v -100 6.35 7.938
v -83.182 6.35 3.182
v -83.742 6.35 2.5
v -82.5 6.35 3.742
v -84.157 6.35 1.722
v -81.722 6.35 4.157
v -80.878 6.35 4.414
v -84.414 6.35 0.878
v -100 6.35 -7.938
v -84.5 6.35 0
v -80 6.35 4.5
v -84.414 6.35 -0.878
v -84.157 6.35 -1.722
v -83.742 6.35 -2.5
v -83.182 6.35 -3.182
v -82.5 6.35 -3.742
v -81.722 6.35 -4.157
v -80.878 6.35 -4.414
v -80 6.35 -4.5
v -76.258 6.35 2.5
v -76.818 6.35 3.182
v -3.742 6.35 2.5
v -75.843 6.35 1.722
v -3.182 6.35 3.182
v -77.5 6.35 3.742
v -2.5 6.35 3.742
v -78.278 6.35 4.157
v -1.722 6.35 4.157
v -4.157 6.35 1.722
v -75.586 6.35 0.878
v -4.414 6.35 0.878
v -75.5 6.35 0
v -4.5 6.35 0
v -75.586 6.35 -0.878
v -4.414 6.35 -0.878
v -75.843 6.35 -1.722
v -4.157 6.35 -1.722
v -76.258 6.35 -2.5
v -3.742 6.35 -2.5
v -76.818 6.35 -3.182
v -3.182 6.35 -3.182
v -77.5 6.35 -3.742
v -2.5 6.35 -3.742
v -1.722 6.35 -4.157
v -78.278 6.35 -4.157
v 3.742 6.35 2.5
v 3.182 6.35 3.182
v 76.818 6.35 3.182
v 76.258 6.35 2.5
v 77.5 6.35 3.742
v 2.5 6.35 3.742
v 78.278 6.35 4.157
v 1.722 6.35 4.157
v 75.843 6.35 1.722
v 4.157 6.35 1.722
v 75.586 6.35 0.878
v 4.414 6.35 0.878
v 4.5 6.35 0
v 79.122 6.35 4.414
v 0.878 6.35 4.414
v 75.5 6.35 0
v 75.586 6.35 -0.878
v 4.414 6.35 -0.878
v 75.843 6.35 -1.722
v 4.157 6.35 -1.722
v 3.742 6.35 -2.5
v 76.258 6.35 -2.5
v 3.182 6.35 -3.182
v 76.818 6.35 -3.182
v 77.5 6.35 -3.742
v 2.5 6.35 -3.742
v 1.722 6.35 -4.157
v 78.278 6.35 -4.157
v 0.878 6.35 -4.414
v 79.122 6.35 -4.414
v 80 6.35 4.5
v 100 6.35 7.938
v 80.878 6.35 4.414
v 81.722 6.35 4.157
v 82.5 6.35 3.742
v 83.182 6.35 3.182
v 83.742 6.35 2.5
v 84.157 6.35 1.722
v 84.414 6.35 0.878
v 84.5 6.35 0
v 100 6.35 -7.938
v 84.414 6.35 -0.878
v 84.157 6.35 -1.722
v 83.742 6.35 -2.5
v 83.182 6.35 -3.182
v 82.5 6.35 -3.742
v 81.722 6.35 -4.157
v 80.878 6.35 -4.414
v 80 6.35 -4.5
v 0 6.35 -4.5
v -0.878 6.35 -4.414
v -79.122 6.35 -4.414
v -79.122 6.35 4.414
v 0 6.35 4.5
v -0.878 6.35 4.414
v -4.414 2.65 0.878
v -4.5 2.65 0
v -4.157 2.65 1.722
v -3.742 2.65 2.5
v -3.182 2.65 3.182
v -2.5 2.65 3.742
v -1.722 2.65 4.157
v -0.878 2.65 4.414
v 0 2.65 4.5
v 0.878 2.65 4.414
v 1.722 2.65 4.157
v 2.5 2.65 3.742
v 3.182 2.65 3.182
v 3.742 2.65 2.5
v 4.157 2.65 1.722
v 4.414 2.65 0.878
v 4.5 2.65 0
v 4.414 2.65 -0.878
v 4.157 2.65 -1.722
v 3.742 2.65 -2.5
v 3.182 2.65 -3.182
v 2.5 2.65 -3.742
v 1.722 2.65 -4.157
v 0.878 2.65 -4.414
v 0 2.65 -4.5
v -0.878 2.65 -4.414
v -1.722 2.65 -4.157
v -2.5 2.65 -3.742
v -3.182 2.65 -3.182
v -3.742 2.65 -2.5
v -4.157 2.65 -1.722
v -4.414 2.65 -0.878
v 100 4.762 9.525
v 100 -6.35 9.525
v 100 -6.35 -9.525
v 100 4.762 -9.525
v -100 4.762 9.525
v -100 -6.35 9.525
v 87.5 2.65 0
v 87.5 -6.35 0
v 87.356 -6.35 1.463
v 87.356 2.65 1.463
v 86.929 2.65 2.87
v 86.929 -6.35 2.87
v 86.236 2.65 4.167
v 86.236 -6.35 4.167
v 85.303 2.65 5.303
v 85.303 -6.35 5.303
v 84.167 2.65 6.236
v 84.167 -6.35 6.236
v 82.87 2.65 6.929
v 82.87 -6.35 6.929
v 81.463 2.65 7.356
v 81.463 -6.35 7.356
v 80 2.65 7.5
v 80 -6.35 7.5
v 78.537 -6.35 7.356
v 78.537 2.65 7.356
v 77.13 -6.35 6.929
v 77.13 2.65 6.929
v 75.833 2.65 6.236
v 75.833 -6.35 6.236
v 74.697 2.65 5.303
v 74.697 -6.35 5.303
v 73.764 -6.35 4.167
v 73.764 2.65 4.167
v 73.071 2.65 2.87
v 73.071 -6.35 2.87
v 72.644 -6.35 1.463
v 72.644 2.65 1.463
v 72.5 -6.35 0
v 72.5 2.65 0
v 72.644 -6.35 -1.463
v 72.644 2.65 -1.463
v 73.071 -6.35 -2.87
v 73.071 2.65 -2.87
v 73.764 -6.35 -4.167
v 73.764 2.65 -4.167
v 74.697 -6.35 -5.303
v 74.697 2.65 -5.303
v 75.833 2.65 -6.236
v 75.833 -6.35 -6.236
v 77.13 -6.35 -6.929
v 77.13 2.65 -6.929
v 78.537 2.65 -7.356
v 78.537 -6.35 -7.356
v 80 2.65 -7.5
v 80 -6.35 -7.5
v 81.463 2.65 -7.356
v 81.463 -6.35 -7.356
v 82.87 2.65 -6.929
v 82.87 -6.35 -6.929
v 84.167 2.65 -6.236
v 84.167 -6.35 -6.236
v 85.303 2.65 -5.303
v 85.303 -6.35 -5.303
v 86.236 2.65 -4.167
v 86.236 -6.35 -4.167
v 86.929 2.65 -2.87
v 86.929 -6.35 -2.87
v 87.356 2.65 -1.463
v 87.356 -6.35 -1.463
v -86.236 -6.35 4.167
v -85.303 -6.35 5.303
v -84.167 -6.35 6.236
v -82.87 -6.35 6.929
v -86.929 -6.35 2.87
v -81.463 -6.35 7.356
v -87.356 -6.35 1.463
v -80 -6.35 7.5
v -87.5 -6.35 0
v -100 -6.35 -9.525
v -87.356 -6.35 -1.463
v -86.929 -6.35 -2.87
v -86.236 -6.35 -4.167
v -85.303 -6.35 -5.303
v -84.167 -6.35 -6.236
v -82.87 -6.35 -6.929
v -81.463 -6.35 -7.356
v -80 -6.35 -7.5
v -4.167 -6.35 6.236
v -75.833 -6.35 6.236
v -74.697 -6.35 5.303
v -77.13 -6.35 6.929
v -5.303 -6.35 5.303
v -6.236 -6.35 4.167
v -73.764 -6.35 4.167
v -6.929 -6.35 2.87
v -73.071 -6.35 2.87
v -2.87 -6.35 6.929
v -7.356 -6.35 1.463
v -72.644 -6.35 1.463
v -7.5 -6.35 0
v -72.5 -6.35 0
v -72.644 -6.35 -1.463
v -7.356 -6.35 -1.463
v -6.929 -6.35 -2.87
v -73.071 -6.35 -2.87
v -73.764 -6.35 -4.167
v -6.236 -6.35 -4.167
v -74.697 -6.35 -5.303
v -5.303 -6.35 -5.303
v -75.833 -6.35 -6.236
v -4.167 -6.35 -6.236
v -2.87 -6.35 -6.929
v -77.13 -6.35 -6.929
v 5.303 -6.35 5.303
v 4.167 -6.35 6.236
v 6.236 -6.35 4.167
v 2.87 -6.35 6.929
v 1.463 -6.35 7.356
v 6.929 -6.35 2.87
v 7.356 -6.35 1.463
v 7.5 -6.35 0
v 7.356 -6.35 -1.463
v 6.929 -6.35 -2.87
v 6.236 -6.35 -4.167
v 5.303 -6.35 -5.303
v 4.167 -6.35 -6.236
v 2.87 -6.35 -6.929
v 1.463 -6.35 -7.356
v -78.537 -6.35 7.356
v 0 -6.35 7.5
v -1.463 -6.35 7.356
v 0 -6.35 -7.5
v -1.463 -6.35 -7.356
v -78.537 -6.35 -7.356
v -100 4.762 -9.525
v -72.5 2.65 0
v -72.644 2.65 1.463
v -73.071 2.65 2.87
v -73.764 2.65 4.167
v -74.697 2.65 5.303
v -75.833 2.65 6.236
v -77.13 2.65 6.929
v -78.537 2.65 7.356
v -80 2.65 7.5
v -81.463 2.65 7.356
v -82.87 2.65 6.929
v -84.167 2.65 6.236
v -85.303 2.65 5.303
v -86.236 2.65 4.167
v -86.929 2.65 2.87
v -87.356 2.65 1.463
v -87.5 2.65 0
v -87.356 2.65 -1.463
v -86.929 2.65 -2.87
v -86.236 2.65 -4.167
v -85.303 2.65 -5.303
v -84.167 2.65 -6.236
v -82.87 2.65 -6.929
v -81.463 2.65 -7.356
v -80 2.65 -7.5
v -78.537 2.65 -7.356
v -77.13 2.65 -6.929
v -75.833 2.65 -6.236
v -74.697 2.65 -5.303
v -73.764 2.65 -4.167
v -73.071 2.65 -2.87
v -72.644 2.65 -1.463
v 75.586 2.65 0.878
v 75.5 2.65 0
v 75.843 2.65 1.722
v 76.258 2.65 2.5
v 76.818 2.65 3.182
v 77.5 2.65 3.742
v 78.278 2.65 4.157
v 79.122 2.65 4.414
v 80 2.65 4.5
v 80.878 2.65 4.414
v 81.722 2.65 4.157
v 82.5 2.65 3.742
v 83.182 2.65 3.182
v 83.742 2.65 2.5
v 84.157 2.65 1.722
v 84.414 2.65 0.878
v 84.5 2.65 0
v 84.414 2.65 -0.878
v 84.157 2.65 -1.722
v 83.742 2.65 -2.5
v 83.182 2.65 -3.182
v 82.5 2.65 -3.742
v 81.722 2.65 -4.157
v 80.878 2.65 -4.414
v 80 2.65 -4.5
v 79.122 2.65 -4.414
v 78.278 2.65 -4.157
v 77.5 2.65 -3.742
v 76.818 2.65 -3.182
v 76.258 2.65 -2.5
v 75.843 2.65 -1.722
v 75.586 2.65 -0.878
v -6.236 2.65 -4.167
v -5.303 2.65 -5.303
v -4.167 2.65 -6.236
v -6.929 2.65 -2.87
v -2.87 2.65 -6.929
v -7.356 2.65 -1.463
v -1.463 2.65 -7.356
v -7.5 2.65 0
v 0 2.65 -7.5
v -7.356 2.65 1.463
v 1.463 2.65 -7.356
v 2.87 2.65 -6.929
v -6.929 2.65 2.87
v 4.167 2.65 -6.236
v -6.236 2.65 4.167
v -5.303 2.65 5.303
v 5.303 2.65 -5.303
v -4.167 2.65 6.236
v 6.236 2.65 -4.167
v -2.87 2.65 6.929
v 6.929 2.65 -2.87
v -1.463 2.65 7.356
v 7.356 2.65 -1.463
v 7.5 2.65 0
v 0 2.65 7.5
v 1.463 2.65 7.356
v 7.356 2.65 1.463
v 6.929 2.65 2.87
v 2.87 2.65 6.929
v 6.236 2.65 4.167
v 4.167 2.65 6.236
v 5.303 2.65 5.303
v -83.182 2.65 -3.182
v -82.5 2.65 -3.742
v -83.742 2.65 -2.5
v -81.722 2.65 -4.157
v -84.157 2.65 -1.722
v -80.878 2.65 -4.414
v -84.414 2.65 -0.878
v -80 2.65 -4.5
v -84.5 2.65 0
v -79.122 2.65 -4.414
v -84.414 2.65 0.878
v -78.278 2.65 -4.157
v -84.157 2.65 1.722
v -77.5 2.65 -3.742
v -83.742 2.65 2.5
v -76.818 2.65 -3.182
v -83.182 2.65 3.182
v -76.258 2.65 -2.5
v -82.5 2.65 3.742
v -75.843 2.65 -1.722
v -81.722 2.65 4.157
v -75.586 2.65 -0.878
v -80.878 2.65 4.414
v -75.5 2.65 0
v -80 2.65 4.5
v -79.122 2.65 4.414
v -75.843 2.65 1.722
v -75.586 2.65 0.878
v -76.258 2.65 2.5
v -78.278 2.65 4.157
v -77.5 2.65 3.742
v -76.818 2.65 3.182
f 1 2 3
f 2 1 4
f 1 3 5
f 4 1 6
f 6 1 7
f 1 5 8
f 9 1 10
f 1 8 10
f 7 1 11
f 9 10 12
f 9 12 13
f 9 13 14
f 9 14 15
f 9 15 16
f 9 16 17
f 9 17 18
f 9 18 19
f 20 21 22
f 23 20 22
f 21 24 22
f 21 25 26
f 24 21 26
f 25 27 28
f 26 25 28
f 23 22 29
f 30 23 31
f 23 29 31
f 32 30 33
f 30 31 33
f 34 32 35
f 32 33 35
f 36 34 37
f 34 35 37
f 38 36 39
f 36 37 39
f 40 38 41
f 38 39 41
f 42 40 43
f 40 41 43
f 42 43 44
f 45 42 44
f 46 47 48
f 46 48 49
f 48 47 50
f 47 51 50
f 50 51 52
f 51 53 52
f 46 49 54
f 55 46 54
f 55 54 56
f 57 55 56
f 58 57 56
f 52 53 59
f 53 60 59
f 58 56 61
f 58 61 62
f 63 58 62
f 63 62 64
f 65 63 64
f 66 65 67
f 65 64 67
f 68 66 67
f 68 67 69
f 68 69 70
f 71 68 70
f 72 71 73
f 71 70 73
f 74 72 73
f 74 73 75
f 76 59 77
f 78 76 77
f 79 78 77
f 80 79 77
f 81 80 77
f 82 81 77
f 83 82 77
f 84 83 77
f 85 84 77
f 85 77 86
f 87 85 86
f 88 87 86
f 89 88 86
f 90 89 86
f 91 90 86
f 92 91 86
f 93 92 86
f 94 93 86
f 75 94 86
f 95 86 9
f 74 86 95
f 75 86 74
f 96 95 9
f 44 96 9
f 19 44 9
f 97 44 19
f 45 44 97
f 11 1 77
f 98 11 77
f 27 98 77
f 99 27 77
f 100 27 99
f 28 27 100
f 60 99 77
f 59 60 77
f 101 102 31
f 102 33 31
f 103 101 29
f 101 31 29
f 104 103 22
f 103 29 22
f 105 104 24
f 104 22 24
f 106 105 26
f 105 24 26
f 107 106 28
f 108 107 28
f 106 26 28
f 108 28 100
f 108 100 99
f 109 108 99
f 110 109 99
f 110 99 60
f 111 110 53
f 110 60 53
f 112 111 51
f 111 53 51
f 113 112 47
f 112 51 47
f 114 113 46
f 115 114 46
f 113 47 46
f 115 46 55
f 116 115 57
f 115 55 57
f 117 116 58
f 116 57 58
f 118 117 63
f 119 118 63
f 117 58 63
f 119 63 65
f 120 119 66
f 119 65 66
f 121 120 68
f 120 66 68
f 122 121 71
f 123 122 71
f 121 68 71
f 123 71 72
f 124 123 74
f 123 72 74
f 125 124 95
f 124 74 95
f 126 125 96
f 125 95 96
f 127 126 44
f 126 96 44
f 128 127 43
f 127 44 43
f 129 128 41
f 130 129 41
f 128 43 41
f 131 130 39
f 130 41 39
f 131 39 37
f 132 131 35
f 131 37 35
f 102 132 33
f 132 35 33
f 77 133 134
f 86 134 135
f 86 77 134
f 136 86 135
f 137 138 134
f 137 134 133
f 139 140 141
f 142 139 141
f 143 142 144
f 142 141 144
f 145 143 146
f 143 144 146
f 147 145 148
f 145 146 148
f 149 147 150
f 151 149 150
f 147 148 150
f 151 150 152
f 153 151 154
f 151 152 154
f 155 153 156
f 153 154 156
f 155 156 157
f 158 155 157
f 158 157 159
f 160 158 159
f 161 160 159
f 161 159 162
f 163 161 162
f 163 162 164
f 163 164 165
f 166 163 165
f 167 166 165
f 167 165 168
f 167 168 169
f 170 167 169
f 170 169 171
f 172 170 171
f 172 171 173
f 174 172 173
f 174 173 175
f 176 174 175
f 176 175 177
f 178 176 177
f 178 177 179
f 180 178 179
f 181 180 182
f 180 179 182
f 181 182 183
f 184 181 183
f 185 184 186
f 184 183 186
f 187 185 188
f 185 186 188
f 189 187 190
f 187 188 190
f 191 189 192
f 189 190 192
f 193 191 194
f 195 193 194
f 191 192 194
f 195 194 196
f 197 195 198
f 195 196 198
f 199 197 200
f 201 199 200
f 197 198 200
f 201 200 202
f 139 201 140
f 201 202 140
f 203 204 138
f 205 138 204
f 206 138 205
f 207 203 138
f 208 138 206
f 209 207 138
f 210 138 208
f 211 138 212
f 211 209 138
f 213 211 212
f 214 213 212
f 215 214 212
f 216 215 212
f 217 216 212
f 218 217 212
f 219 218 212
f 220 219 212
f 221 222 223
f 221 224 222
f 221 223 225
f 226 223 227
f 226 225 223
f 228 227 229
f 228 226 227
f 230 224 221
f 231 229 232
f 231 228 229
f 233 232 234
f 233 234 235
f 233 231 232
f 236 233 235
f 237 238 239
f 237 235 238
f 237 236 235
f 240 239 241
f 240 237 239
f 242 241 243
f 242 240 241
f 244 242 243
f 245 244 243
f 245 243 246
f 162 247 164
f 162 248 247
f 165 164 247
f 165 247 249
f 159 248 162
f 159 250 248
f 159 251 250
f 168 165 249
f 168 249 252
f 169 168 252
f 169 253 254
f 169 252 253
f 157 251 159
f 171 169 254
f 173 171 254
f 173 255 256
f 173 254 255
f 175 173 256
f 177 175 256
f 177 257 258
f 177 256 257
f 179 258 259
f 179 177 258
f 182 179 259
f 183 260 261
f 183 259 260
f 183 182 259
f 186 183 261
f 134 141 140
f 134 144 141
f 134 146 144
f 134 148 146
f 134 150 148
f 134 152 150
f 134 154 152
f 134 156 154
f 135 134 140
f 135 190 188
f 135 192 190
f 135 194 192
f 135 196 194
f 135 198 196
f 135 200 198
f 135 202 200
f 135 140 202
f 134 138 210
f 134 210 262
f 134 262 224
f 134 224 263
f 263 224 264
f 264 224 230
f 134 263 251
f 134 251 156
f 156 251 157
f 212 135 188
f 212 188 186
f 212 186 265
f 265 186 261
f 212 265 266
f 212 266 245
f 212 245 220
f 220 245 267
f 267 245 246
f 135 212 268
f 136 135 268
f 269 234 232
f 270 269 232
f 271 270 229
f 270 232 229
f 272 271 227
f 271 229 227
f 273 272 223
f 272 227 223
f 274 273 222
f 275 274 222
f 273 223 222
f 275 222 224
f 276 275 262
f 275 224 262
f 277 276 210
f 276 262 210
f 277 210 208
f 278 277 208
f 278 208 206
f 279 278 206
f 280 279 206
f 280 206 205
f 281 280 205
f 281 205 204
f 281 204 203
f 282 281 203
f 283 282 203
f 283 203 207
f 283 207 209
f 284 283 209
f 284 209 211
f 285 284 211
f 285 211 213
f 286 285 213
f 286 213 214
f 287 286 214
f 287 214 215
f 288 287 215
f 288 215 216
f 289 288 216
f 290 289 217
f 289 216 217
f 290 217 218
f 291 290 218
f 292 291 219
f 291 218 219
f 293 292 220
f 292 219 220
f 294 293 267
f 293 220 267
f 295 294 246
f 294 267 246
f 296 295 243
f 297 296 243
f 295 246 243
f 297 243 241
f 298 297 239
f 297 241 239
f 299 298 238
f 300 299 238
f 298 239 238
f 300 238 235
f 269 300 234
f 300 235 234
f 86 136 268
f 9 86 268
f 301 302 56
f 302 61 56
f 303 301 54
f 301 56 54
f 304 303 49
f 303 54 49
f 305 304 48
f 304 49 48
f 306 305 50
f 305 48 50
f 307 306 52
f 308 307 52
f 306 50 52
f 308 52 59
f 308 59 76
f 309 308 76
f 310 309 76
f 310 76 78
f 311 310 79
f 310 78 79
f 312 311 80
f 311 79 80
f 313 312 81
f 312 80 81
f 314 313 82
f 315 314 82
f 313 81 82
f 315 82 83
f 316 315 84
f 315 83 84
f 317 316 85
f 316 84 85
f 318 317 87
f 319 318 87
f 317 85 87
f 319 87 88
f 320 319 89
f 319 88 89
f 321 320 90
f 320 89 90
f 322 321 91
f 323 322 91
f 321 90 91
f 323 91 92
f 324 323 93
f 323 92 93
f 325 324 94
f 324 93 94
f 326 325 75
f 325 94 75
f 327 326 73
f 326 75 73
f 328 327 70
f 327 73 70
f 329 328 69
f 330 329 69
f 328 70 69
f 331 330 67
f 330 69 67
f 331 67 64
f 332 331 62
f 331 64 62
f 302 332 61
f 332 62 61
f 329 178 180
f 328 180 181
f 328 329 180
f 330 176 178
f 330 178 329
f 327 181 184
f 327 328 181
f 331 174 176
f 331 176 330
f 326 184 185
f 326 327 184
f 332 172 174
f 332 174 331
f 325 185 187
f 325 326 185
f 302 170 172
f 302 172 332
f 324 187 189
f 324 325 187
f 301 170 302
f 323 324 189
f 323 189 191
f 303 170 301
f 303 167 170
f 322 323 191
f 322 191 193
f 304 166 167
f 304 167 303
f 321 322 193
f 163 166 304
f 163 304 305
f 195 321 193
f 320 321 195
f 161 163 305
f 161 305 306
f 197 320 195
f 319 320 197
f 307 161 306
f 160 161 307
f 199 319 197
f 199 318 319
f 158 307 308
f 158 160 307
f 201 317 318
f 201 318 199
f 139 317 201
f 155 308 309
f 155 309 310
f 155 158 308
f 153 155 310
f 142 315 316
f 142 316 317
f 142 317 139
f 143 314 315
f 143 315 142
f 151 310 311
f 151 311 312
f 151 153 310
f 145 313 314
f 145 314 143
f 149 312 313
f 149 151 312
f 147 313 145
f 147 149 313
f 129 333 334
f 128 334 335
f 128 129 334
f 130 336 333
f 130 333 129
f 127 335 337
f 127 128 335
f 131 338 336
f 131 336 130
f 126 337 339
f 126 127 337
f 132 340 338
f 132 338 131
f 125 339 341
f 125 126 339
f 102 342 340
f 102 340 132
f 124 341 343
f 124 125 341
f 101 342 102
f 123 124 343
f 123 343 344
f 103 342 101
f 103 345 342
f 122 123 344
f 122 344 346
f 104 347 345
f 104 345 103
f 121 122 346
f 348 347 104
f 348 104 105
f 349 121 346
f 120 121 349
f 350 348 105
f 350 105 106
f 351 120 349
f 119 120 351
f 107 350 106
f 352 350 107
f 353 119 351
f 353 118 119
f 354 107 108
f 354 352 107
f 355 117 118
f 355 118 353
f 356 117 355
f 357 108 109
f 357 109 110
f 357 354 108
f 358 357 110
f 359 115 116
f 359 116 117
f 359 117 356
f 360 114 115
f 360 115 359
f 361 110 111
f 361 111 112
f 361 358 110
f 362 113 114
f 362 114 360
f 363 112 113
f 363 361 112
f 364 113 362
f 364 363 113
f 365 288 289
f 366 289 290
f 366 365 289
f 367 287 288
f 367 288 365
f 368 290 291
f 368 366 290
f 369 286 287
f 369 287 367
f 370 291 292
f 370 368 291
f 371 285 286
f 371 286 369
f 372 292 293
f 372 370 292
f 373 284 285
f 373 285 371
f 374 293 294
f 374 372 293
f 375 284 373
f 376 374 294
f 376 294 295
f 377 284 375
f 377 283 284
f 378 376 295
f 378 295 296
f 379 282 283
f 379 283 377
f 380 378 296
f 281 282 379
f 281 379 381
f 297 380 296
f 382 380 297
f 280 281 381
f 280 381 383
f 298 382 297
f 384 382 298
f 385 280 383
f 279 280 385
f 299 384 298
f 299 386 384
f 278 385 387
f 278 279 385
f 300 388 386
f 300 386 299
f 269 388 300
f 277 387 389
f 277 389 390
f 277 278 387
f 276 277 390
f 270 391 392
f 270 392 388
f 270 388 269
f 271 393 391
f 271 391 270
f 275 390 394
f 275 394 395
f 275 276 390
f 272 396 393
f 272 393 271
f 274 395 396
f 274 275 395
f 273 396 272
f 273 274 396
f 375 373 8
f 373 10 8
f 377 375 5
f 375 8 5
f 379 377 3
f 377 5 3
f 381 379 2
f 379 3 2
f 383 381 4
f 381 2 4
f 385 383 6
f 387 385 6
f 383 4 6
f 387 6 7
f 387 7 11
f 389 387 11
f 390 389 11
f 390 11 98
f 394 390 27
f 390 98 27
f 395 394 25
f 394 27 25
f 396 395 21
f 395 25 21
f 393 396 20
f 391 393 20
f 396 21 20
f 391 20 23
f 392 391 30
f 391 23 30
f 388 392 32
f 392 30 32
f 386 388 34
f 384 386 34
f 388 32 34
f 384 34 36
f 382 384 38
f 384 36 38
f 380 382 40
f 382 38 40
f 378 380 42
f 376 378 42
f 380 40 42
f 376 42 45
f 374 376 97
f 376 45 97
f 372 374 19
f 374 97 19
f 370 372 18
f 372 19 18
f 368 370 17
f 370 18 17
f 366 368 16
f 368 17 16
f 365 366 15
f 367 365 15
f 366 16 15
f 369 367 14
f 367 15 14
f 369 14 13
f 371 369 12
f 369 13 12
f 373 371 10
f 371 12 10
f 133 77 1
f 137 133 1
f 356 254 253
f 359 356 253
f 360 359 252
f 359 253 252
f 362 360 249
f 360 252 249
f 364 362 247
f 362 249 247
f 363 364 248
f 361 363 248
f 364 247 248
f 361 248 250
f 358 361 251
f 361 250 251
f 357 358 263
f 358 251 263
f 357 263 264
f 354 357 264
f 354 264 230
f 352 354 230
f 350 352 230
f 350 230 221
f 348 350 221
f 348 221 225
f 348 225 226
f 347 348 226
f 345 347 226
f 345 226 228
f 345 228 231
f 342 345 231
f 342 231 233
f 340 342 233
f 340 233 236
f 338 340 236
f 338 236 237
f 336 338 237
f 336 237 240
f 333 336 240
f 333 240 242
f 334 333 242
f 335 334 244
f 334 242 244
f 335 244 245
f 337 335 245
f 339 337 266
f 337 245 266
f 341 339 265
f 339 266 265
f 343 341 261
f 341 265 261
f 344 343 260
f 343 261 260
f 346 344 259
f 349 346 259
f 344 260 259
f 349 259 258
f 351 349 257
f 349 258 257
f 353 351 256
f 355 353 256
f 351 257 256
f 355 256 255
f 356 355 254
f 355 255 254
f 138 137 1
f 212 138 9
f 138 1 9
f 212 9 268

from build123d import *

# Parameters (mm, degrees)
SKETCH1_W                                           = 19.05
SKETCH1_H                                           = 12.7
BOSS_EXTRUDE1_DEPTH                                 = 100
CBORE_FOR_M8_HEX_SOCKET_HEAD_CAP_SCREW1_D           = 9
CBORE_FOR_M8_HEX_SOCKET_HEAD_CAP_SCREW1_CBORE_D     = 15
CBORE_FOR_M8_HEX_SOCKET_HEAD_CAP_SCREW1_CBORE_DEPTH = 9
CHAMFER1_SIZE                                       = 1.5875


with BuildPart() as part:
    # Sketch1 → Boss-Extrude1 (new, symmetric)
    with BuildSketch(Plane(origin=(0, 0, 0), x_dir=(0, 0, -1), z_dir=(1, 0, 0))):
        Rectangle(SKETCH1_W, SKETCH1_H)
    extrude(amount=BOSS_EXTRUDE1_DEPTH, both=True)

    # CBORE for M8 Hex Socket Head Cap Screw1 (through all)
    with Locations(Plane(origin=(-66.368908966, -6.35, -4.540102203), x_dir=(1, 0, 0), z_dir=(0, -1, 0))):
        with Locations((-13.631091034, 4.540102203), (66.368908966, 4.540102203), (146.368908966, 4.540102203)):
            CounterBoreHole(CBORE_FOR_M8_HEX_SOCKET_HEAD_CAP_SCREW1_D / 2, CBORE_FOR_M8_HEX_SOCKET_HEAD_CAP_SCREW1_CBORE_D / 2, CBORE_FOR_M8_HEX_SOCKET_HEAD_CAP_SCREW1_CBORE_DEPTH)

    # Chamfer1
    chamfer1_edges = [part.edges().sort_by_distance(p)[0] for p in [
        (0, 6.35, 9.525),
        (0, 6.35, -9.525),
    ]]
    chamfer(chamfer1_edges, length=CHAMFER1_SIZE)


solid = part.part
